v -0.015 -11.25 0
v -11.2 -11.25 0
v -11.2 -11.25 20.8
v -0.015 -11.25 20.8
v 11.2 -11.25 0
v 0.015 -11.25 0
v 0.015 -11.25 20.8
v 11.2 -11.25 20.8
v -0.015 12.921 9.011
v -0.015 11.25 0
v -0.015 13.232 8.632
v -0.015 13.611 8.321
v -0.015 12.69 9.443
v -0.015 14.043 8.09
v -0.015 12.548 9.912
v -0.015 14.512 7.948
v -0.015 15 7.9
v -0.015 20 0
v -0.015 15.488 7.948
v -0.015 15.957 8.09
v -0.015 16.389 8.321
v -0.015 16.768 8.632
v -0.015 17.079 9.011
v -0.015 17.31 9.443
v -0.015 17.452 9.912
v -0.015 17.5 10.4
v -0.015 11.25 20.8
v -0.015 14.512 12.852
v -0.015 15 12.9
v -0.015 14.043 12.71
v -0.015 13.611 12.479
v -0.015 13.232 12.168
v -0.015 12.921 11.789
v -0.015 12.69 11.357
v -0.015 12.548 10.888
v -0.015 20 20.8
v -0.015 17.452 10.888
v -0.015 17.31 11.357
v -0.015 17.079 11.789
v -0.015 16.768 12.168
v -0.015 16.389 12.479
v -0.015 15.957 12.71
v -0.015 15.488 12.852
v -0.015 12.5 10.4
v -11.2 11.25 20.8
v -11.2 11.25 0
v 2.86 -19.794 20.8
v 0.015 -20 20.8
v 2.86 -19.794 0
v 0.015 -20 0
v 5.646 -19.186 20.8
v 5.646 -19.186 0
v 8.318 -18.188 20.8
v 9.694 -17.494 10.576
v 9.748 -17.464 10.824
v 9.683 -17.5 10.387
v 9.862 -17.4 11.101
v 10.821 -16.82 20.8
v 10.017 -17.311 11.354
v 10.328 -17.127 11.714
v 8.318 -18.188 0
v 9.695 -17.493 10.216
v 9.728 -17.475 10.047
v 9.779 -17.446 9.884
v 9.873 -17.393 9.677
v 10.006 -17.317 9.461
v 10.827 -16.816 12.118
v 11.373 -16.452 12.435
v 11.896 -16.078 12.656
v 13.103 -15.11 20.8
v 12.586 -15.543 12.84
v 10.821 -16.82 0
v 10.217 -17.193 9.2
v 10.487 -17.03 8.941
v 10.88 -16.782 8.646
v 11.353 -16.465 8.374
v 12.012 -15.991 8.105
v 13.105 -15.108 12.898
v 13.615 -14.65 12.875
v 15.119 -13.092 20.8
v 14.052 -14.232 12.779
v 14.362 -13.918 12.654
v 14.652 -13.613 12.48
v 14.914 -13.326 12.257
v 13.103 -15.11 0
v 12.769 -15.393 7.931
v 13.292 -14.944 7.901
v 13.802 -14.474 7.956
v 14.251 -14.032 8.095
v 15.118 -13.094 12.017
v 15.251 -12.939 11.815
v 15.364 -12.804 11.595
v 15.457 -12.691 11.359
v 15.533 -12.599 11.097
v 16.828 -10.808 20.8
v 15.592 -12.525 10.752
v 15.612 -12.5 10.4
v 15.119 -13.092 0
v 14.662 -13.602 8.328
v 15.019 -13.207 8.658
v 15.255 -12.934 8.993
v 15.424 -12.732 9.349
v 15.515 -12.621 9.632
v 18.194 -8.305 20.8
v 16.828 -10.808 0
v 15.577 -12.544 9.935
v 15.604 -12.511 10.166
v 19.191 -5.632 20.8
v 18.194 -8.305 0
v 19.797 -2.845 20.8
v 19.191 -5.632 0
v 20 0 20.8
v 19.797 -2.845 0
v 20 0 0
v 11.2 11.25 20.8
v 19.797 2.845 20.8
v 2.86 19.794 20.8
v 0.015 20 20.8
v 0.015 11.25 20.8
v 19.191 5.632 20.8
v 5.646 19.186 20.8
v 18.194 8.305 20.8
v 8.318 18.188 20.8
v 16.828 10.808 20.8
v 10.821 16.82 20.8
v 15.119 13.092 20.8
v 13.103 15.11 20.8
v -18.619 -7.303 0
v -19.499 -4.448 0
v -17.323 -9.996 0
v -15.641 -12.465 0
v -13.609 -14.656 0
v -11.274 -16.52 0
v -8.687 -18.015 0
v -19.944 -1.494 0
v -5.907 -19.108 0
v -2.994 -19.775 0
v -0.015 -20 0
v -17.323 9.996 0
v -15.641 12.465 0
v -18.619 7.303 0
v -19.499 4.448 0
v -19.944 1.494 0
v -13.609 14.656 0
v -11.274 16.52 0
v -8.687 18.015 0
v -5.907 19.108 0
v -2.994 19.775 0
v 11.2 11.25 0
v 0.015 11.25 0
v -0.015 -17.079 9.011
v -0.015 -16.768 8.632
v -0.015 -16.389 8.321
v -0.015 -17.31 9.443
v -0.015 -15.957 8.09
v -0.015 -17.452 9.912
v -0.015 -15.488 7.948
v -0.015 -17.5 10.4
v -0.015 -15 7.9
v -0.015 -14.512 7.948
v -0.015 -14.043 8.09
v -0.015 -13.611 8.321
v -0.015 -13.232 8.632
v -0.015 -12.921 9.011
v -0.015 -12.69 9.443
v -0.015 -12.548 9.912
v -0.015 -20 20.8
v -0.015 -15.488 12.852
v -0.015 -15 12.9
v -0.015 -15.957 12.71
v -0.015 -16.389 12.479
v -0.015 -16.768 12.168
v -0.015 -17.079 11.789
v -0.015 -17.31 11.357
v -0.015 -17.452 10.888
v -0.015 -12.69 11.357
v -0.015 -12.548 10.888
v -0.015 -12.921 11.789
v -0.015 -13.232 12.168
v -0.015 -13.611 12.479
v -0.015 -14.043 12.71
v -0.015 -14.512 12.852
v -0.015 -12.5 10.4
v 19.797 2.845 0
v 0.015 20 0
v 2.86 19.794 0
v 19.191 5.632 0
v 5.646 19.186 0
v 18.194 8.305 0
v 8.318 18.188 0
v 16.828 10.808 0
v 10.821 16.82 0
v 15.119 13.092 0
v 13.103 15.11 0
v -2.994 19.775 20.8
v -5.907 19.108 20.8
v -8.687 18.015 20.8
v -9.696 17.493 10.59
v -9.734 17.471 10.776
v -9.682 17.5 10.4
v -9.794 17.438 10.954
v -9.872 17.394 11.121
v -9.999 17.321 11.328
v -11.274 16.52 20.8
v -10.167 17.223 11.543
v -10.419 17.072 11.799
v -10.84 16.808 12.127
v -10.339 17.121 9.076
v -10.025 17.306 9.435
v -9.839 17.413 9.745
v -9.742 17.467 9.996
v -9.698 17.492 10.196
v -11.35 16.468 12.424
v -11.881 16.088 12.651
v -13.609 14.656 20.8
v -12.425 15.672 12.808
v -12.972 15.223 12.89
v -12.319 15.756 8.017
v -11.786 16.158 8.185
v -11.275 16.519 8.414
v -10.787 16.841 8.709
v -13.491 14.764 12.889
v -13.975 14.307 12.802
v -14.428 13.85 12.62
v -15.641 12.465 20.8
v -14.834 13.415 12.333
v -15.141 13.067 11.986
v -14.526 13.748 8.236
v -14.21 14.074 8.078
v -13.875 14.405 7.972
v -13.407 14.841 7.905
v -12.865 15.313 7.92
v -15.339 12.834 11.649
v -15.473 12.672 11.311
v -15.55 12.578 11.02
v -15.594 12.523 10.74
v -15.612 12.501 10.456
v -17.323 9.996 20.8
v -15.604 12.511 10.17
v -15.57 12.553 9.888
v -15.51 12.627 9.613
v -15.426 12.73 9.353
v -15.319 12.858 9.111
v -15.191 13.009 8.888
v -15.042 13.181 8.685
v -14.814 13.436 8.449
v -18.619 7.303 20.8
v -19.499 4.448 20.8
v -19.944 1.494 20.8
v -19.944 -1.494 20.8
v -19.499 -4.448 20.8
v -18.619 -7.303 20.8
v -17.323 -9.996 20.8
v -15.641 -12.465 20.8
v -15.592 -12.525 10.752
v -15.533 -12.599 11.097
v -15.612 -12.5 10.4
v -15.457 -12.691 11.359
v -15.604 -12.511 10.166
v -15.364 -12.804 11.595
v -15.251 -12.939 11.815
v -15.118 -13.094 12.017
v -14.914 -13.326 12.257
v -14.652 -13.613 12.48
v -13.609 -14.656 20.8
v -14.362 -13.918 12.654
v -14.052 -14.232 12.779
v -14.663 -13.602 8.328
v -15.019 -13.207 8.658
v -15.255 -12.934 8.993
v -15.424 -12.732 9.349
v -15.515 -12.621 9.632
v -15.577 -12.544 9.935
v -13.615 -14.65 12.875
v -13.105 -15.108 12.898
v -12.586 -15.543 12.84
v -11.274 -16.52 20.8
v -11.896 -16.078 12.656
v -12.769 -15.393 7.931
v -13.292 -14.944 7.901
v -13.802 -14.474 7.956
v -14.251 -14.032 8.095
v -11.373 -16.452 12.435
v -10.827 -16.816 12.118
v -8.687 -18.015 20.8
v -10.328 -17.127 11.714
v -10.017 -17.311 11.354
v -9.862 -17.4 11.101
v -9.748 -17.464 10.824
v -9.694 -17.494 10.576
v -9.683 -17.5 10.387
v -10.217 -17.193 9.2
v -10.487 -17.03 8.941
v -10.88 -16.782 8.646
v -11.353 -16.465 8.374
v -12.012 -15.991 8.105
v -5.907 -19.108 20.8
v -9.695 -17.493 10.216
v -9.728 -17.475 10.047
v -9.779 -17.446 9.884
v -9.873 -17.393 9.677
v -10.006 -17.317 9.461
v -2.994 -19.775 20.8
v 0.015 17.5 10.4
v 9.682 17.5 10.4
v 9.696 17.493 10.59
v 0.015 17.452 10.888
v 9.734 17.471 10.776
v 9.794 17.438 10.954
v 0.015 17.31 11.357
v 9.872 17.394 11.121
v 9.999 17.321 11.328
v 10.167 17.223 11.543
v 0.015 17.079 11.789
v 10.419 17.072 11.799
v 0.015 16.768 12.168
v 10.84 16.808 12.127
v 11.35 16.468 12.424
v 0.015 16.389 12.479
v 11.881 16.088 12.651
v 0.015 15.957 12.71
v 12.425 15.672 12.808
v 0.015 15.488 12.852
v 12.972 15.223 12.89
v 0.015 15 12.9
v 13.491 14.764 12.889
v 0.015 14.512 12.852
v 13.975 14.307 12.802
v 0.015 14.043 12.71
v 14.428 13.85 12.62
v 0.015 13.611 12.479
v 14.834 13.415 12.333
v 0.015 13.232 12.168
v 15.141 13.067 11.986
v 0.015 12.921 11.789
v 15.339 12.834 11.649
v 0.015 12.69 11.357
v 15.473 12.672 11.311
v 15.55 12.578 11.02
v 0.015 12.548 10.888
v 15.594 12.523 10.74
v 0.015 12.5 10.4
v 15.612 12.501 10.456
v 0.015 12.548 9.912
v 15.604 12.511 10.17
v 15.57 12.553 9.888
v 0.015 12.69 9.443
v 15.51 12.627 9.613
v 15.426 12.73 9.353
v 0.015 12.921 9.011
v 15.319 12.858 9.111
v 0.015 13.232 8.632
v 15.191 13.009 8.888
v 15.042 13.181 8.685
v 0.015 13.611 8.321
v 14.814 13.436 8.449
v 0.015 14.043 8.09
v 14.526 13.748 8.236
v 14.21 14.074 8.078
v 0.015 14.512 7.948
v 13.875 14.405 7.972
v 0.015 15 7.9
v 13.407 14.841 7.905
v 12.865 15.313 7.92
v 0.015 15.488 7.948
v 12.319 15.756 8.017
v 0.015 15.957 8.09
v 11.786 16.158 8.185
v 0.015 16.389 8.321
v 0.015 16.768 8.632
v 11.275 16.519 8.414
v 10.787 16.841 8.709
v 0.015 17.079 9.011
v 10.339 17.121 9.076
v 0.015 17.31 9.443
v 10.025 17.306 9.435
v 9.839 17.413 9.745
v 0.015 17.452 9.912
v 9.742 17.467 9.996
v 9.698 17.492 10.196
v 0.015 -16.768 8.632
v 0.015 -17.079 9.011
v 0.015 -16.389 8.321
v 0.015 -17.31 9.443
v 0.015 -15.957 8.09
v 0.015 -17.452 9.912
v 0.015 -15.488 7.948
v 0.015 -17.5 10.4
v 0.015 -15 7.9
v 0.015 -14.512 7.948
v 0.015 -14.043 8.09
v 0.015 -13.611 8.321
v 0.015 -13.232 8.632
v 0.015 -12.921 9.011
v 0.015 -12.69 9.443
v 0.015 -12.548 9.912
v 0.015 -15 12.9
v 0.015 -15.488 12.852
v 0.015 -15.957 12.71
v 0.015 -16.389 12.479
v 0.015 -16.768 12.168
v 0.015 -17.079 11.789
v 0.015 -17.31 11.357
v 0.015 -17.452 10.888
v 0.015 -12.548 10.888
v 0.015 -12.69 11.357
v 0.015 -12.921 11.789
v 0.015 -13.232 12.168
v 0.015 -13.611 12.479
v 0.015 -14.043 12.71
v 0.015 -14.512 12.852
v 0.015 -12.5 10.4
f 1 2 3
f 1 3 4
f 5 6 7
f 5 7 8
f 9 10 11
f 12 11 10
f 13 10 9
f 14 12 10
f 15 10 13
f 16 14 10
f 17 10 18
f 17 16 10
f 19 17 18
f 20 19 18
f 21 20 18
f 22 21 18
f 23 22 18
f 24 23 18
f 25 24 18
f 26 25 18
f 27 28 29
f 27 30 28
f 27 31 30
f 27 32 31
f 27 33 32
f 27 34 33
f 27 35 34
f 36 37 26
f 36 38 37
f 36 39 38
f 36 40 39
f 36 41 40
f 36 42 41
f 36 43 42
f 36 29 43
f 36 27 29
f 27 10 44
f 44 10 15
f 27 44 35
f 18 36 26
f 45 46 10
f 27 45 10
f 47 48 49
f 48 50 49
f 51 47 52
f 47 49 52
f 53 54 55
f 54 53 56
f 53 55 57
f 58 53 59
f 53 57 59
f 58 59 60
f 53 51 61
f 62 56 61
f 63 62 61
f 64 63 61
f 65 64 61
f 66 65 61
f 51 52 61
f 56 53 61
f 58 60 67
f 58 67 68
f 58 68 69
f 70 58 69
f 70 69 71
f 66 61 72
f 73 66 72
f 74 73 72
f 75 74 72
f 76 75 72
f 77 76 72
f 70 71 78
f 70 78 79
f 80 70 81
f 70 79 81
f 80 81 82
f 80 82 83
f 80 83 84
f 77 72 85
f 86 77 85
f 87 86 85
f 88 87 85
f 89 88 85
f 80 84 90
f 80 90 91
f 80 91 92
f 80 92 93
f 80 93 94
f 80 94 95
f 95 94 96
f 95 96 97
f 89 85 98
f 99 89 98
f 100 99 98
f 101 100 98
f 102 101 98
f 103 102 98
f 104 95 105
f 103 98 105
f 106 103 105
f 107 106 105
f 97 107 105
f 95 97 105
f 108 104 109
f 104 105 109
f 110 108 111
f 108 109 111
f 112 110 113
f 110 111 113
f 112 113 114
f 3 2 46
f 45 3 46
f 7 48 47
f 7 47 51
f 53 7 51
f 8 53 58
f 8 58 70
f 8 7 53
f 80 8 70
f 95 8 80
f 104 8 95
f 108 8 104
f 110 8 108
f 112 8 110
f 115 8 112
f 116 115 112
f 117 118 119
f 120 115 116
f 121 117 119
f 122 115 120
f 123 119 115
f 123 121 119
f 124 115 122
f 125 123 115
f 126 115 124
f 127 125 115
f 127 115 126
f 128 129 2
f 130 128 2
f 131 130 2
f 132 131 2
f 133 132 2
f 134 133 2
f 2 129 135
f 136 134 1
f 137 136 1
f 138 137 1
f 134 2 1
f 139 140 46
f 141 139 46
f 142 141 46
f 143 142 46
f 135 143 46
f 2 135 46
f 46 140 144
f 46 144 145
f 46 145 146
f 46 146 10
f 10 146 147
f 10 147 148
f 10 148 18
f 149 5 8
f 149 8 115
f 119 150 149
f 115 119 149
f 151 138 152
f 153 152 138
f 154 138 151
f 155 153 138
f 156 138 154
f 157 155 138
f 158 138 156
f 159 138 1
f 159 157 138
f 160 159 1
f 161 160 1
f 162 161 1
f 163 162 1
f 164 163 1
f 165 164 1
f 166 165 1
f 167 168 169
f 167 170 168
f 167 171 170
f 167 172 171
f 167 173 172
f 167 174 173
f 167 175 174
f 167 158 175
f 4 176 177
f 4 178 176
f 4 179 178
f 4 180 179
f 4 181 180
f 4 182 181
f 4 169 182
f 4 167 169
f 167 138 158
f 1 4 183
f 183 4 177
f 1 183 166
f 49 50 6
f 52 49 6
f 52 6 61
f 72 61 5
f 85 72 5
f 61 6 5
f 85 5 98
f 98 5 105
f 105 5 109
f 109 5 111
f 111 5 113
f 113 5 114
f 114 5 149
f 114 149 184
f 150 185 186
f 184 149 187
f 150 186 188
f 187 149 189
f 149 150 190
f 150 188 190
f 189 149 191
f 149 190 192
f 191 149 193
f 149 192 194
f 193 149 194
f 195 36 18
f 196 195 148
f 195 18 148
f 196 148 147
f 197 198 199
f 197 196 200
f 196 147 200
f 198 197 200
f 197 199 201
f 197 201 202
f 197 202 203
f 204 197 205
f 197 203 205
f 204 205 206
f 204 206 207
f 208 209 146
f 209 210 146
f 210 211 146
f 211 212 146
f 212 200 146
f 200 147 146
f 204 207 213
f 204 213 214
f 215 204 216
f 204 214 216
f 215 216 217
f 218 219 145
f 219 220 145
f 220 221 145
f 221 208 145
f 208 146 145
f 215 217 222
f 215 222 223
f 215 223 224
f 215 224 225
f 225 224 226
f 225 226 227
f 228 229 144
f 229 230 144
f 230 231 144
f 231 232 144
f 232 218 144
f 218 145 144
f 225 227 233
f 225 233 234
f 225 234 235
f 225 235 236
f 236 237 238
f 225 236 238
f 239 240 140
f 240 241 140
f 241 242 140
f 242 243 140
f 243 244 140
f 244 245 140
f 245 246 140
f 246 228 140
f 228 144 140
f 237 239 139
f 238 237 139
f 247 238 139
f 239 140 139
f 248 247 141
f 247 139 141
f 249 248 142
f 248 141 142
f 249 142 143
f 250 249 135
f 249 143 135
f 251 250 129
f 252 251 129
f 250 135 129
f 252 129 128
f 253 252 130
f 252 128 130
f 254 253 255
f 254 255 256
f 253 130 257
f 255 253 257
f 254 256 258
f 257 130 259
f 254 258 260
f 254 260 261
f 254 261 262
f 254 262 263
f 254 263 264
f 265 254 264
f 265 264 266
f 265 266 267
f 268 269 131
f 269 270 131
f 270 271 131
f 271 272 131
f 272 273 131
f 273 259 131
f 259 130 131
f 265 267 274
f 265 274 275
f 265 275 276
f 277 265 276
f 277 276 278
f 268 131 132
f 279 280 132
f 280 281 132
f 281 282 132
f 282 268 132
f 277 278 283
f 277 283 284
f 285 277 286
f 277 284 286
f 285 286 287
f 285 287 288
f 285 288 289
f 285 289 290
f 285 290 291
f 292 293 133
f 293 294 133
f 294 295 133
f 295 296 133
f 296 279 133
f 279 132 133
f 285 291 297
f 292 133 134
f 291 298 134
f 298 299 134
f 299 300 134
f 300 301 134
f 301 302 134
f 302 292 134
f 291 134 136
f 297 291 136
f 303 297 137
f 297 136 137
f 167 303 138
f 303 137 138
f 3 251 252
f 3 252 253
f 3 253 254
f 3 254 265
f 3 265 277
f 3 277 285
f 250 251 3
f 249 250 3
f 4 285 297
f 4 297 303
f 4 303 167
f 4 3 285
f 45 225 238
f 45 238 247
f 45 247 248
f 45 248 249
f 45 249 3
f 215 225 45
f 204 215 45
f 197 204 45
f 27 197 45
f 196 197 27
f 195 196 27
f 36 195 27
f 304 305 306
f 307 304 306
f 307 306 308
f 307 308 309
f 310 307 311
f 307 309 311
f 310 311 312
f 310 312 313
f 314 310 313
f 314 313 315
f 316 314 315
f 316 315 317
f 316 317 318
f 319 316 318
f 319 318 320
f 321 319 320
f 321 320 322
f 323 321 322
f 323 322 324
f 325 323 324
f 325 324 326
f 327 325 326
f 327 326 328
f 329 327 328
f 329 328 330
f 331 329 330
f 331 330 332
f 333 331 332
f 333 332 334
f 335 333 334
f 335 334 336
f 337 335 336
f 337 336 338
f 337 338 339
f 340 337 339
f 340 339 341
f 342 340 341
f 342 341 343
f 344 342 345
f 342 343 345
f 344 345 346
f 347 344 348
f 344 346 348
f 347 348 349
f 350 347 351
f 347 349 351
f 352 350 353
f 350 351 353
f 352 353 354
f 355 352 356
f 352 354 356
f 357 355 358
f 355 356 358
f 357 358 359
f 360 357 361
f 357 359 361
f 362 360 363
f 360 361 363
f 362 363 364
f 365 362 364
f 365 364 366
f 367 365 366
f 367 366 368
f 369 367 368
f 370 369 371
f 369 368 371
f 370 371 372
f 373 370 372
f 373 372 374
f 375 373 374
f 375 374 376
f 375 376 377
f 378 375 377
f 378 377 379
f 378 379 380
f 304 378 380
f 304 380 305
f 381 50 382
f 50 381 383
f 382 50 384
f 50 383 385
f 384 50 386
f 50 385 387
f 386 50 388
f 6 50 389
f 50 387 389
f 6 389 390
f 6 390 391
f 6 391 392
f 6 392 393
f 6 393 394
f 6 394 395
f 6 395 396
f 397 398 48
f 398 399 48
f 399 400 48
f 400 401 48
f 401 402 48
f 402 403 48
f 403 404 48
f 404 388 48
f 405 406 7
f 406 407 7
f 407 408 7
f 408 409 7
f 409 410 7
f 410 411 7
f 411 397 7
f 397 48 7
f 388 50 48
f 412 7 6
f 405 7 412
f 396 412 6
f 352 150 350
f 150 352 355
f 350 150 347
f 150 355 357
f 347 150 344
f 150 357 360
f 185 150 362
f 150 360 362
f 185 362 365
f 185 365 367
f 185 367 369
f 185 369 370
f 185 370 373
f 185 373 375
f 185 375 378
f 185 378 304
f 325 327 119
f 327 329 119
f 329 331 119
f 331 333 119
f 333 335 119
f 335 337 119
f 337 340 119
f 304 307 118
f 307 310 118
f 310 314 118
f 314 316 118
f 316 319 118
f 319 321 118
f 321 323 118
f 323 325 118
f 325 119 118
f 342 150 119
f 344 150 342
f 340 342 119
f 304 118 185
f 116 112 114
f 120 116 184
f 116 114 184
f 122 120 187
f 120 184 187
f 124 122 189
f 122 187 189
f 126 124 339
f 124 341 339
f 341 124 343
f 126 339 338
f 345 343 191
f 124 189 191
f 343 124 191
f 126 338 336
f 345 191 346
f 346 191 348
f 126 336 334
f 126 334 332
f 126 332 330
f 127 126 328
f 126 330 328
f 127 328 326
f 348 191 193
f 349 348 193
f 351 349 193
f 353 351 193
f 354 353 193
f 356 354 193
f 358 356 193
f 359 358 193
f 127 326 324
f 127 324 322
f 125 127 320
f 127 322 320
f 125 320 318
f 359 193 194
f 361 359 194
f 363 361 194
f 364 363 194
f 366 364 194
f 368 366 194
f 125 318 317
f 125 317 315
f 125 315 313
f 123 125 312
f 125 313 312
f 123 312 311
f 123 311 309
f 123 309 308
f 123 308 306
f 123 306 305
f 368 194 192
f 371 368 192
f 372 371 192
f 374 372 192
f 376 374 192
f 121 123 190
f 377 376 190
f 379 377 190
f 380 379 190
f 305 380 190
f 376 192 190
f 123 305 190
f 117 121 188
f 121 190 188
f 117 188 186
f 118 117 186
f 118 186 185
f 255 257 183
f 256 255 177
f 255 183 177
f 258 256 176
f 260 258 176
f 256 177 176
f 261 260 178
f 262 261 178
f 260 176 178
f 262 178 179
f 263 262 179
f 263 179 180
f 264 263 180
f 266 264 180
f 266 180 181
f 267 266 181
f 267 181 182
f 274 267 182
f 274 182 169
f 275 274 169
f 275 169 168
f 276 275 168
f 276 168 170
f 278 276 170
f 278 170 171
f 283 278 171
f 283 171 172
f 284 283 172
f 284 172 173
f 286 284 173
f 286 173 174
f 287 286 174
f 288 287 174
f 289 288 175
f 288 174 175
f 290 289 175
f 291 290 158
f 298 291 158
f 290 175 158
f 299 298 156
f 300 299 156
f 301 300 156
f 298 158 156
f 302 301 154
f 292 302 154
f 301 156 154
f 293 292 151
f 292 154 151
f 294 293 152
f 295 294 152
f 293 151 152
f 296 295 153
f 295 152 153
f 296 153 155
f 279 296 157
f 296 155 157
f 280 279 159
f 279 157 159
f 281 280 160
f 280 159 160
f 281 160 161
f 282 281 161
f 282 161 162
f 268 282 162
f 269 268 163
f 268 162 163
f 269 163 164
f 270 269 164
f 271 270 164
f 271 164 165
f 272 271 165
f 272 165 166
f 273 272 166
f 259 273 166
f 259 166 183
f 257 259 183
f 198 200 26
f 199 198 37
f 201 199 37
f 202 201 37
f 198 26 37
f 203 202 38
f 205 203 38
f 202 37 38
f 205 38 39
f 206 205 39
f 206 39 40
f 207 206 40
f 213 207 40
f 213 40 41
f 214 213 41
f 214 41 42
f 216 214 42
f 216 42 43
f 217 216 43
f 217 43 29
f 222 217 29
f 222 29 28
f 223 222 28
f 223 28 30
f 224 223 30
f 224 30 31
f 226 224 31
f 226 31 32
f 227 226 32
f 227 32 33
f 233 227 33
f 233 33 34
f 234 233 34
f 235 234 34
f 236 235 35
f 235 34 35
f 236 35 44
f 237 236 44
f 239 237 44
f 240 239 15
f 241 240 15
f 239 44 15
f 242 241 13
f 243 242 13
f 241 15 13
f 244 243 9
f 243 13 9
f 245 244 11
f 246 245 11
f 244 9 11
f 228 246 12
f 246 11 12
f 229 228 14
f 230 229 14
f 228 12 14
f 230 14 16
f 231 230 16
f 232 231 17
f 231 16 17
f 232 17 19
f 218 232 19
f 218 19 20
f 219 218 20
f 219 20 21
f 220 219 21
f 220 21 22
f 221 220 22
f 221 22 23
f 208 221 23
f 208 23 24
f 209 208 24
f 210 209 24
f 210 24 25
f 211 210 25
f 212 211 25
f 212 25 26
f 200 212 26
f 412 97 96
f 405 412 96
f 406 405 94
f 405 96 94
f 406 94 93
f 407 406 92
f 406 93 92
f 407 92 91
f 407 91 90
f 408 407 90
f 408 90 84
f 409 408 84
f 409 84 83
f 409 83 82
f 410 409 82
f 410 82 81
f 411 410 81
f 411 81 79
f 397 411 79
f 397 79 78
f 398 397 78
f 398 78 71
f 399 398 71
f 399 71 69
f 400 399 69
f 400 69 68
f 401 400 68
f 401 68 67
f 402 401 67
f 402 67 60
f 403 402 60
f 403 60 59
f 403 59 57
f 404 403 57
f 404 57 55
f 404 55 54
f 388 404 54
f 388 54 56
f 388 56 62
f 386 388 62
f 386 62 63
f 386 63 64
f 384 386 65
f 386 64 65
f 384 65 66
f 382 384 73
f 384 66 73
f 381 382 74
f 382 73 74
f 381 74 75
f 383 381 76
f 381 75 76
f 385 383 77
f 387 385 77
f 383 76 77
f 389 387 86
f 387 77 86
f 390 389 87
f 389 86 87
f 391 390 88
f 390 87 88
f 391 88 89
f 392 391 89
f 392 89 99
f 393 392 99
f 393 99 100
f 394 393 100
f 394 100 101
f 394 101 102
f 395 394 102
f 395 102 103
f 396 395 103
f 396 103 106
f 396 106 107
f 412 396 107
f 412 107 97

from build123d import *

# Parameters (mm, degrees)
F0_R     = 20
F0_W     = 22.4
F0_H     = 22.5
F1_DEPTH = 20.8
F3_R     = 2.5
F4_DEPTH = 40.001
F5_W     = 0.03
F5_H     = 50
F6_DEPTH = 20.801


with BuildPart() as f1:
    # F0 (on Top) → F1 (new body)
    with BuildSketch(Plane.XY):
        Circle(F0_R)
        Rectangle(F0_W, F0_H, mode=Mode.SUBTRACT)
    extrude(amount=F1_DEPTH)

    # F3 (on offset) → F4 (cut, through all)
    with BuildSketch(Plane.YZ.offset(20)):
        with Locations((-15, 10.4)):
            Circle(F3_R)
        with Locations((15, 10.4)):
            Circle(F3_R)
    extrude(amount=-F4_DEPTH, mode=Mode.SUBTRACT)

    # F5 (on face) → F6 (cut, through all)
    with BuildSketch(Plane.XY.offset(20.8)):
        Rectangle(F5_W, F5_H)
    extrude(amount=-F6_DEPTH, mode=Mode.SUBTRACT)


solid = f1.part
